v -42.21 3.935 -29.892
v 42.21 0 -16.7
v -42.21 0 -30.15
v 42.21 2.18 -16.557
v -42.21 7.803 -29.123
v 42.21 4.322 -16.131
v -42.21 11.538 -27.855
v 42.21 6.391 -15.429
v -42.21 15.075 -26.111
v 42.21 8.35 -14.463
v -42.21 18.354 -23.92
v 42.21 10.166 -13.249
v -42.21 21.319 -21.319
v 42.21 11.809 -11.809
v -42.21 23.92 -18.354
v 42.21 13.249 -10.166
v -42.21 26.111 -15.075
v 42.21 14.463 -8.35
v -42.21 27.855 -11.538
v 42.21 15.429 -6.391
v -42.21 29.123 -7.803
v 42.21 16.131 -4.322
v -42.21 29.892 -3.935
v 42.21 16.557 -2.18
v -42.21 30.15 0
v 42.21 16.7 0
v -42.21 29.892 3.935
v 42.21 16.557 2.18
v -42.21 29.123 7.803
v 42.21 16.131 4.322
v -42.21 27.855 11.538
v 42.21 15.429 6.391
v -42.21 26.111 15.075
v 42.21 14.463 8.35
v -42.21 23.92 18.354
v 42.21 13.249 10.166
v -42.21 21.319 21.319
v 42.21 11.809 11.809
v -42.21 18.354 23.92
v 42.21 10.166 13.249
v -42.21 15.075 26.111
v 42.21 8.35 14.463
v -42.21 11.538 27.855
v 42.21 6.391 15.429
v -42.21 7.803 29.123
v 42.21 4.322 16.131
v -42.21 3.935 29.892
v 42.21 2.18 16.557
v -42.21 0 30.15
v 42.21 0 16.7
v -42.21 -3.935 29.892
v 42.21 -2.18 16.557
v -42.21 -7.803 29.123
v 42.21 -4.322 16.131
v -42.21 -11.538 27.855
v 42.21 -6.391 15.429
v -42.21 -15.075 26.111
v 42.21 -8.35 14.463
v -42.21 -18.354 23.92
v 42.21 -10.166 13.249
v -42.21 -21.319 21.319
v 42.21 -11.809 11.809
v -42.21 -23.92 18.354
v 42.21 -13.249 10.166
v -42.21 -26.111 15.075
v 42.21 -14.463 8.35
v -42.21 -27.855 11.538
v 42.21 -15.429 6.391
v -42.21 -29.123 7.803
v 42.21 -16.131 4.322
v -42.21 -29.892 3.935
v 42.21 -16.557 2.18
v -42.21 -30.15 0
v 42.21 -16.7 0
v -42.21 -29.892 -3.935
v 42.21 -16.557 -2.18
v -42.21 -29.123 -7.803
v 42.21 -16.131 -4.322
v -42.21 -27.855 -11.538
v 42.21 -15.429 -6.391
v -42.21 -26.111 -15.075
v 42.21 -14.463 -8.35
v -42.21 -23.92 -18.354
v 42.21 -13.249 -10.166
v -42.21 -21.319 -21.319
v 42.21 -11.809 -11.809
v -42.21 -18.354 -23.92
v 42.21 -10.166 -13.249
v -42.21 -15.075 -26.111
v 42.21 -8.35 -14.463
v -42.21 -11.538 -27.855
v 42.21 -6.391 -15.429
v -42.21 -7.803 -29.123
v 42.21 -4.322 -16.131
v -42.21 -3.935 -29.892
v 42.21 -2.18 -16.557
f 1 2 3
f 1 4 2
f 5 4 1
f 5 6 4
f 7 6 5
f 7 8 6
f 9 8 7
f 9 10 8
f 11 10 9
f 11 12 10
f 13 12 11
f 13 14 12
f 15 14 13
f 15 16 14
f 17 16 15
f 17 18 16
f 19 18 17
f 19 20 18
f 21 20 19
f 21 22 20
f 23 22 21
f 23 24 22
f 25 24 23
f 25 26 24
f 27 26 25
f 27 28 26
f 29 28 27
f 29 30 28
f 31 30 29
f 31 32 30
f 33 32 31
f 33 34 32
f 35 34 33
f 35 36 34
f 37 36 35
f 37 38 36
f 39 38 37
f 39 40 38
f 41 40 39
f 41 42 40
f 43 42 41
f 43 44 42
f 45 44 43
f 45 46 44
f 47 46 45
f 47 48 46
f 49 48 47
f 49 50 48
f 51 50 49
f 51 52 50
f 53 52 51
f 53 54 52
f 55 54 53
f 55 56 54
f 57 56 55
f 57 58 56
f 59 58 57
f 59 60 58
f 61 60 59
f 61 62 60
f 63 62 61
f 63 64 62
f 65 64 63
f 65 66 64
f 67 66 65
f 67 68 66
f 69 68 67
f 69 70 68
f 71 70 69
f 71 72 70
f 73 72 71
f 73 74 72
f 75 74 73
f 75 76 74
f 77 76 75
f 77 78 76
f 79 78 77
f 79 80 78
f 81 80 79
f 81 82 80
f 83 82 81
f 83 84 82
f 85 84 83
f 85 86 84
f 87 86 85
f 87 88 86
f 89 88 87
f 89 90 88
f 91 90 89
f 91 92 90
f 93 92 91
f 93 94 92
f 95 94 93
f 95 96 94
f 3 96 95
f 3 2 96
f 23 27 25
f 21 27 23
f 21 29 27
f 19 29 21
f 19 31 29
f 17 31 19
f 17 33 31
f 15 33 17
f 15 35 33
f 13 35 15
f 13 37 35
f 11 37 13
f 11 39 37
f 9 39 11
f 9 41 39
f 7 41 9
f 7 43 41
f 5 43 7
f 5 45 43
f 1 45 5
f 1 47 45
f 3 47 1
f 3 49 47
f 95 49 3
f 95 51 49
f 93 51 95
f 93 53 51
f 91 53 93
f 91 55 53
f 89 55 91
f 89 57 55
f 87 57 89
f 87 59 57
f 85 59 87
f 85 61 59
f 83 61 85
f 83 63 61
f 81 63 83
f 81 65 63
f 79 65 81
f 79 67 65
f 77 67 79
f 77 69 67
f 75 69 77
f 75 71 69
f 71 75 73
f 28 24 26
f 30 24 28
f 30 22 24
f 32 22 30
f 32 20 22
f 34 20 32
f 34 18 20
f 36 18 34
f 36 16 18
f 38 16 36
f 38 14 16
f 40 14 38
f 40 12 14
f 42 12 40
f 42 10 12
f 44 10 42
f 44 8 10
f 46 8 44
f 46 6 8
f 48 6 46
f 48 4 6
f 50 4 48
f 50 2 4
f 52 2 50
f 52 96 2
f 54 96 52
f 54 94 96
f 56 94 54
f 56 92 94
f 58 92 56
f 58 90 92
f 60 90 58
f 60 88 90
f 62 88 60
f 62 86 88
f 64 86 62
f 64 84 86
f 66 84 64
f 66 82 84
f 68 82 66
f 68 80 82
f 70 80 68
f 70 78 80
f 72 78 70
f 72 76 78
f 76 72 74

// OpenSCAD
// Concentric reducer. Large end at -X, small end at +X. Origin at center.
//
//   inlet_large:  (-L/2, 0, 0), dir (-1, 0, 0)
//   outlet_small: (+L/2, 0, 0), dir (+1, 0, 0)

size_in_large = 2;
size_in_small = 1;

function od_mm(nps) =
    nps ==   1  ? 33.4 :
    nps == 1.25 ? 42.2 :
    nps == 1.5  ? 48.3 :
    nps ==   2  ? 60.3 :
    nps == 2.5  ? 73.0 :
    nps ==   3  ? 88.9 :
    nps ==   4  ? 114.3 :
    nps ==   5  ? 141.3 :
    nps ==   6  ? 168.3 :
    nps ==   8  ? 219.1 :
    nps ==  10  ? 273.0 : 60.3;

od_big   = od_mm(size_in_large);
od_small = od_mm(size_in_small);
len_mm   = od_big * 1.4;

rotate([0, 90, 0])
    cylinder(h = len_mm, d1 = od_big, d2 = od_small, center = true, $fn = 48);
